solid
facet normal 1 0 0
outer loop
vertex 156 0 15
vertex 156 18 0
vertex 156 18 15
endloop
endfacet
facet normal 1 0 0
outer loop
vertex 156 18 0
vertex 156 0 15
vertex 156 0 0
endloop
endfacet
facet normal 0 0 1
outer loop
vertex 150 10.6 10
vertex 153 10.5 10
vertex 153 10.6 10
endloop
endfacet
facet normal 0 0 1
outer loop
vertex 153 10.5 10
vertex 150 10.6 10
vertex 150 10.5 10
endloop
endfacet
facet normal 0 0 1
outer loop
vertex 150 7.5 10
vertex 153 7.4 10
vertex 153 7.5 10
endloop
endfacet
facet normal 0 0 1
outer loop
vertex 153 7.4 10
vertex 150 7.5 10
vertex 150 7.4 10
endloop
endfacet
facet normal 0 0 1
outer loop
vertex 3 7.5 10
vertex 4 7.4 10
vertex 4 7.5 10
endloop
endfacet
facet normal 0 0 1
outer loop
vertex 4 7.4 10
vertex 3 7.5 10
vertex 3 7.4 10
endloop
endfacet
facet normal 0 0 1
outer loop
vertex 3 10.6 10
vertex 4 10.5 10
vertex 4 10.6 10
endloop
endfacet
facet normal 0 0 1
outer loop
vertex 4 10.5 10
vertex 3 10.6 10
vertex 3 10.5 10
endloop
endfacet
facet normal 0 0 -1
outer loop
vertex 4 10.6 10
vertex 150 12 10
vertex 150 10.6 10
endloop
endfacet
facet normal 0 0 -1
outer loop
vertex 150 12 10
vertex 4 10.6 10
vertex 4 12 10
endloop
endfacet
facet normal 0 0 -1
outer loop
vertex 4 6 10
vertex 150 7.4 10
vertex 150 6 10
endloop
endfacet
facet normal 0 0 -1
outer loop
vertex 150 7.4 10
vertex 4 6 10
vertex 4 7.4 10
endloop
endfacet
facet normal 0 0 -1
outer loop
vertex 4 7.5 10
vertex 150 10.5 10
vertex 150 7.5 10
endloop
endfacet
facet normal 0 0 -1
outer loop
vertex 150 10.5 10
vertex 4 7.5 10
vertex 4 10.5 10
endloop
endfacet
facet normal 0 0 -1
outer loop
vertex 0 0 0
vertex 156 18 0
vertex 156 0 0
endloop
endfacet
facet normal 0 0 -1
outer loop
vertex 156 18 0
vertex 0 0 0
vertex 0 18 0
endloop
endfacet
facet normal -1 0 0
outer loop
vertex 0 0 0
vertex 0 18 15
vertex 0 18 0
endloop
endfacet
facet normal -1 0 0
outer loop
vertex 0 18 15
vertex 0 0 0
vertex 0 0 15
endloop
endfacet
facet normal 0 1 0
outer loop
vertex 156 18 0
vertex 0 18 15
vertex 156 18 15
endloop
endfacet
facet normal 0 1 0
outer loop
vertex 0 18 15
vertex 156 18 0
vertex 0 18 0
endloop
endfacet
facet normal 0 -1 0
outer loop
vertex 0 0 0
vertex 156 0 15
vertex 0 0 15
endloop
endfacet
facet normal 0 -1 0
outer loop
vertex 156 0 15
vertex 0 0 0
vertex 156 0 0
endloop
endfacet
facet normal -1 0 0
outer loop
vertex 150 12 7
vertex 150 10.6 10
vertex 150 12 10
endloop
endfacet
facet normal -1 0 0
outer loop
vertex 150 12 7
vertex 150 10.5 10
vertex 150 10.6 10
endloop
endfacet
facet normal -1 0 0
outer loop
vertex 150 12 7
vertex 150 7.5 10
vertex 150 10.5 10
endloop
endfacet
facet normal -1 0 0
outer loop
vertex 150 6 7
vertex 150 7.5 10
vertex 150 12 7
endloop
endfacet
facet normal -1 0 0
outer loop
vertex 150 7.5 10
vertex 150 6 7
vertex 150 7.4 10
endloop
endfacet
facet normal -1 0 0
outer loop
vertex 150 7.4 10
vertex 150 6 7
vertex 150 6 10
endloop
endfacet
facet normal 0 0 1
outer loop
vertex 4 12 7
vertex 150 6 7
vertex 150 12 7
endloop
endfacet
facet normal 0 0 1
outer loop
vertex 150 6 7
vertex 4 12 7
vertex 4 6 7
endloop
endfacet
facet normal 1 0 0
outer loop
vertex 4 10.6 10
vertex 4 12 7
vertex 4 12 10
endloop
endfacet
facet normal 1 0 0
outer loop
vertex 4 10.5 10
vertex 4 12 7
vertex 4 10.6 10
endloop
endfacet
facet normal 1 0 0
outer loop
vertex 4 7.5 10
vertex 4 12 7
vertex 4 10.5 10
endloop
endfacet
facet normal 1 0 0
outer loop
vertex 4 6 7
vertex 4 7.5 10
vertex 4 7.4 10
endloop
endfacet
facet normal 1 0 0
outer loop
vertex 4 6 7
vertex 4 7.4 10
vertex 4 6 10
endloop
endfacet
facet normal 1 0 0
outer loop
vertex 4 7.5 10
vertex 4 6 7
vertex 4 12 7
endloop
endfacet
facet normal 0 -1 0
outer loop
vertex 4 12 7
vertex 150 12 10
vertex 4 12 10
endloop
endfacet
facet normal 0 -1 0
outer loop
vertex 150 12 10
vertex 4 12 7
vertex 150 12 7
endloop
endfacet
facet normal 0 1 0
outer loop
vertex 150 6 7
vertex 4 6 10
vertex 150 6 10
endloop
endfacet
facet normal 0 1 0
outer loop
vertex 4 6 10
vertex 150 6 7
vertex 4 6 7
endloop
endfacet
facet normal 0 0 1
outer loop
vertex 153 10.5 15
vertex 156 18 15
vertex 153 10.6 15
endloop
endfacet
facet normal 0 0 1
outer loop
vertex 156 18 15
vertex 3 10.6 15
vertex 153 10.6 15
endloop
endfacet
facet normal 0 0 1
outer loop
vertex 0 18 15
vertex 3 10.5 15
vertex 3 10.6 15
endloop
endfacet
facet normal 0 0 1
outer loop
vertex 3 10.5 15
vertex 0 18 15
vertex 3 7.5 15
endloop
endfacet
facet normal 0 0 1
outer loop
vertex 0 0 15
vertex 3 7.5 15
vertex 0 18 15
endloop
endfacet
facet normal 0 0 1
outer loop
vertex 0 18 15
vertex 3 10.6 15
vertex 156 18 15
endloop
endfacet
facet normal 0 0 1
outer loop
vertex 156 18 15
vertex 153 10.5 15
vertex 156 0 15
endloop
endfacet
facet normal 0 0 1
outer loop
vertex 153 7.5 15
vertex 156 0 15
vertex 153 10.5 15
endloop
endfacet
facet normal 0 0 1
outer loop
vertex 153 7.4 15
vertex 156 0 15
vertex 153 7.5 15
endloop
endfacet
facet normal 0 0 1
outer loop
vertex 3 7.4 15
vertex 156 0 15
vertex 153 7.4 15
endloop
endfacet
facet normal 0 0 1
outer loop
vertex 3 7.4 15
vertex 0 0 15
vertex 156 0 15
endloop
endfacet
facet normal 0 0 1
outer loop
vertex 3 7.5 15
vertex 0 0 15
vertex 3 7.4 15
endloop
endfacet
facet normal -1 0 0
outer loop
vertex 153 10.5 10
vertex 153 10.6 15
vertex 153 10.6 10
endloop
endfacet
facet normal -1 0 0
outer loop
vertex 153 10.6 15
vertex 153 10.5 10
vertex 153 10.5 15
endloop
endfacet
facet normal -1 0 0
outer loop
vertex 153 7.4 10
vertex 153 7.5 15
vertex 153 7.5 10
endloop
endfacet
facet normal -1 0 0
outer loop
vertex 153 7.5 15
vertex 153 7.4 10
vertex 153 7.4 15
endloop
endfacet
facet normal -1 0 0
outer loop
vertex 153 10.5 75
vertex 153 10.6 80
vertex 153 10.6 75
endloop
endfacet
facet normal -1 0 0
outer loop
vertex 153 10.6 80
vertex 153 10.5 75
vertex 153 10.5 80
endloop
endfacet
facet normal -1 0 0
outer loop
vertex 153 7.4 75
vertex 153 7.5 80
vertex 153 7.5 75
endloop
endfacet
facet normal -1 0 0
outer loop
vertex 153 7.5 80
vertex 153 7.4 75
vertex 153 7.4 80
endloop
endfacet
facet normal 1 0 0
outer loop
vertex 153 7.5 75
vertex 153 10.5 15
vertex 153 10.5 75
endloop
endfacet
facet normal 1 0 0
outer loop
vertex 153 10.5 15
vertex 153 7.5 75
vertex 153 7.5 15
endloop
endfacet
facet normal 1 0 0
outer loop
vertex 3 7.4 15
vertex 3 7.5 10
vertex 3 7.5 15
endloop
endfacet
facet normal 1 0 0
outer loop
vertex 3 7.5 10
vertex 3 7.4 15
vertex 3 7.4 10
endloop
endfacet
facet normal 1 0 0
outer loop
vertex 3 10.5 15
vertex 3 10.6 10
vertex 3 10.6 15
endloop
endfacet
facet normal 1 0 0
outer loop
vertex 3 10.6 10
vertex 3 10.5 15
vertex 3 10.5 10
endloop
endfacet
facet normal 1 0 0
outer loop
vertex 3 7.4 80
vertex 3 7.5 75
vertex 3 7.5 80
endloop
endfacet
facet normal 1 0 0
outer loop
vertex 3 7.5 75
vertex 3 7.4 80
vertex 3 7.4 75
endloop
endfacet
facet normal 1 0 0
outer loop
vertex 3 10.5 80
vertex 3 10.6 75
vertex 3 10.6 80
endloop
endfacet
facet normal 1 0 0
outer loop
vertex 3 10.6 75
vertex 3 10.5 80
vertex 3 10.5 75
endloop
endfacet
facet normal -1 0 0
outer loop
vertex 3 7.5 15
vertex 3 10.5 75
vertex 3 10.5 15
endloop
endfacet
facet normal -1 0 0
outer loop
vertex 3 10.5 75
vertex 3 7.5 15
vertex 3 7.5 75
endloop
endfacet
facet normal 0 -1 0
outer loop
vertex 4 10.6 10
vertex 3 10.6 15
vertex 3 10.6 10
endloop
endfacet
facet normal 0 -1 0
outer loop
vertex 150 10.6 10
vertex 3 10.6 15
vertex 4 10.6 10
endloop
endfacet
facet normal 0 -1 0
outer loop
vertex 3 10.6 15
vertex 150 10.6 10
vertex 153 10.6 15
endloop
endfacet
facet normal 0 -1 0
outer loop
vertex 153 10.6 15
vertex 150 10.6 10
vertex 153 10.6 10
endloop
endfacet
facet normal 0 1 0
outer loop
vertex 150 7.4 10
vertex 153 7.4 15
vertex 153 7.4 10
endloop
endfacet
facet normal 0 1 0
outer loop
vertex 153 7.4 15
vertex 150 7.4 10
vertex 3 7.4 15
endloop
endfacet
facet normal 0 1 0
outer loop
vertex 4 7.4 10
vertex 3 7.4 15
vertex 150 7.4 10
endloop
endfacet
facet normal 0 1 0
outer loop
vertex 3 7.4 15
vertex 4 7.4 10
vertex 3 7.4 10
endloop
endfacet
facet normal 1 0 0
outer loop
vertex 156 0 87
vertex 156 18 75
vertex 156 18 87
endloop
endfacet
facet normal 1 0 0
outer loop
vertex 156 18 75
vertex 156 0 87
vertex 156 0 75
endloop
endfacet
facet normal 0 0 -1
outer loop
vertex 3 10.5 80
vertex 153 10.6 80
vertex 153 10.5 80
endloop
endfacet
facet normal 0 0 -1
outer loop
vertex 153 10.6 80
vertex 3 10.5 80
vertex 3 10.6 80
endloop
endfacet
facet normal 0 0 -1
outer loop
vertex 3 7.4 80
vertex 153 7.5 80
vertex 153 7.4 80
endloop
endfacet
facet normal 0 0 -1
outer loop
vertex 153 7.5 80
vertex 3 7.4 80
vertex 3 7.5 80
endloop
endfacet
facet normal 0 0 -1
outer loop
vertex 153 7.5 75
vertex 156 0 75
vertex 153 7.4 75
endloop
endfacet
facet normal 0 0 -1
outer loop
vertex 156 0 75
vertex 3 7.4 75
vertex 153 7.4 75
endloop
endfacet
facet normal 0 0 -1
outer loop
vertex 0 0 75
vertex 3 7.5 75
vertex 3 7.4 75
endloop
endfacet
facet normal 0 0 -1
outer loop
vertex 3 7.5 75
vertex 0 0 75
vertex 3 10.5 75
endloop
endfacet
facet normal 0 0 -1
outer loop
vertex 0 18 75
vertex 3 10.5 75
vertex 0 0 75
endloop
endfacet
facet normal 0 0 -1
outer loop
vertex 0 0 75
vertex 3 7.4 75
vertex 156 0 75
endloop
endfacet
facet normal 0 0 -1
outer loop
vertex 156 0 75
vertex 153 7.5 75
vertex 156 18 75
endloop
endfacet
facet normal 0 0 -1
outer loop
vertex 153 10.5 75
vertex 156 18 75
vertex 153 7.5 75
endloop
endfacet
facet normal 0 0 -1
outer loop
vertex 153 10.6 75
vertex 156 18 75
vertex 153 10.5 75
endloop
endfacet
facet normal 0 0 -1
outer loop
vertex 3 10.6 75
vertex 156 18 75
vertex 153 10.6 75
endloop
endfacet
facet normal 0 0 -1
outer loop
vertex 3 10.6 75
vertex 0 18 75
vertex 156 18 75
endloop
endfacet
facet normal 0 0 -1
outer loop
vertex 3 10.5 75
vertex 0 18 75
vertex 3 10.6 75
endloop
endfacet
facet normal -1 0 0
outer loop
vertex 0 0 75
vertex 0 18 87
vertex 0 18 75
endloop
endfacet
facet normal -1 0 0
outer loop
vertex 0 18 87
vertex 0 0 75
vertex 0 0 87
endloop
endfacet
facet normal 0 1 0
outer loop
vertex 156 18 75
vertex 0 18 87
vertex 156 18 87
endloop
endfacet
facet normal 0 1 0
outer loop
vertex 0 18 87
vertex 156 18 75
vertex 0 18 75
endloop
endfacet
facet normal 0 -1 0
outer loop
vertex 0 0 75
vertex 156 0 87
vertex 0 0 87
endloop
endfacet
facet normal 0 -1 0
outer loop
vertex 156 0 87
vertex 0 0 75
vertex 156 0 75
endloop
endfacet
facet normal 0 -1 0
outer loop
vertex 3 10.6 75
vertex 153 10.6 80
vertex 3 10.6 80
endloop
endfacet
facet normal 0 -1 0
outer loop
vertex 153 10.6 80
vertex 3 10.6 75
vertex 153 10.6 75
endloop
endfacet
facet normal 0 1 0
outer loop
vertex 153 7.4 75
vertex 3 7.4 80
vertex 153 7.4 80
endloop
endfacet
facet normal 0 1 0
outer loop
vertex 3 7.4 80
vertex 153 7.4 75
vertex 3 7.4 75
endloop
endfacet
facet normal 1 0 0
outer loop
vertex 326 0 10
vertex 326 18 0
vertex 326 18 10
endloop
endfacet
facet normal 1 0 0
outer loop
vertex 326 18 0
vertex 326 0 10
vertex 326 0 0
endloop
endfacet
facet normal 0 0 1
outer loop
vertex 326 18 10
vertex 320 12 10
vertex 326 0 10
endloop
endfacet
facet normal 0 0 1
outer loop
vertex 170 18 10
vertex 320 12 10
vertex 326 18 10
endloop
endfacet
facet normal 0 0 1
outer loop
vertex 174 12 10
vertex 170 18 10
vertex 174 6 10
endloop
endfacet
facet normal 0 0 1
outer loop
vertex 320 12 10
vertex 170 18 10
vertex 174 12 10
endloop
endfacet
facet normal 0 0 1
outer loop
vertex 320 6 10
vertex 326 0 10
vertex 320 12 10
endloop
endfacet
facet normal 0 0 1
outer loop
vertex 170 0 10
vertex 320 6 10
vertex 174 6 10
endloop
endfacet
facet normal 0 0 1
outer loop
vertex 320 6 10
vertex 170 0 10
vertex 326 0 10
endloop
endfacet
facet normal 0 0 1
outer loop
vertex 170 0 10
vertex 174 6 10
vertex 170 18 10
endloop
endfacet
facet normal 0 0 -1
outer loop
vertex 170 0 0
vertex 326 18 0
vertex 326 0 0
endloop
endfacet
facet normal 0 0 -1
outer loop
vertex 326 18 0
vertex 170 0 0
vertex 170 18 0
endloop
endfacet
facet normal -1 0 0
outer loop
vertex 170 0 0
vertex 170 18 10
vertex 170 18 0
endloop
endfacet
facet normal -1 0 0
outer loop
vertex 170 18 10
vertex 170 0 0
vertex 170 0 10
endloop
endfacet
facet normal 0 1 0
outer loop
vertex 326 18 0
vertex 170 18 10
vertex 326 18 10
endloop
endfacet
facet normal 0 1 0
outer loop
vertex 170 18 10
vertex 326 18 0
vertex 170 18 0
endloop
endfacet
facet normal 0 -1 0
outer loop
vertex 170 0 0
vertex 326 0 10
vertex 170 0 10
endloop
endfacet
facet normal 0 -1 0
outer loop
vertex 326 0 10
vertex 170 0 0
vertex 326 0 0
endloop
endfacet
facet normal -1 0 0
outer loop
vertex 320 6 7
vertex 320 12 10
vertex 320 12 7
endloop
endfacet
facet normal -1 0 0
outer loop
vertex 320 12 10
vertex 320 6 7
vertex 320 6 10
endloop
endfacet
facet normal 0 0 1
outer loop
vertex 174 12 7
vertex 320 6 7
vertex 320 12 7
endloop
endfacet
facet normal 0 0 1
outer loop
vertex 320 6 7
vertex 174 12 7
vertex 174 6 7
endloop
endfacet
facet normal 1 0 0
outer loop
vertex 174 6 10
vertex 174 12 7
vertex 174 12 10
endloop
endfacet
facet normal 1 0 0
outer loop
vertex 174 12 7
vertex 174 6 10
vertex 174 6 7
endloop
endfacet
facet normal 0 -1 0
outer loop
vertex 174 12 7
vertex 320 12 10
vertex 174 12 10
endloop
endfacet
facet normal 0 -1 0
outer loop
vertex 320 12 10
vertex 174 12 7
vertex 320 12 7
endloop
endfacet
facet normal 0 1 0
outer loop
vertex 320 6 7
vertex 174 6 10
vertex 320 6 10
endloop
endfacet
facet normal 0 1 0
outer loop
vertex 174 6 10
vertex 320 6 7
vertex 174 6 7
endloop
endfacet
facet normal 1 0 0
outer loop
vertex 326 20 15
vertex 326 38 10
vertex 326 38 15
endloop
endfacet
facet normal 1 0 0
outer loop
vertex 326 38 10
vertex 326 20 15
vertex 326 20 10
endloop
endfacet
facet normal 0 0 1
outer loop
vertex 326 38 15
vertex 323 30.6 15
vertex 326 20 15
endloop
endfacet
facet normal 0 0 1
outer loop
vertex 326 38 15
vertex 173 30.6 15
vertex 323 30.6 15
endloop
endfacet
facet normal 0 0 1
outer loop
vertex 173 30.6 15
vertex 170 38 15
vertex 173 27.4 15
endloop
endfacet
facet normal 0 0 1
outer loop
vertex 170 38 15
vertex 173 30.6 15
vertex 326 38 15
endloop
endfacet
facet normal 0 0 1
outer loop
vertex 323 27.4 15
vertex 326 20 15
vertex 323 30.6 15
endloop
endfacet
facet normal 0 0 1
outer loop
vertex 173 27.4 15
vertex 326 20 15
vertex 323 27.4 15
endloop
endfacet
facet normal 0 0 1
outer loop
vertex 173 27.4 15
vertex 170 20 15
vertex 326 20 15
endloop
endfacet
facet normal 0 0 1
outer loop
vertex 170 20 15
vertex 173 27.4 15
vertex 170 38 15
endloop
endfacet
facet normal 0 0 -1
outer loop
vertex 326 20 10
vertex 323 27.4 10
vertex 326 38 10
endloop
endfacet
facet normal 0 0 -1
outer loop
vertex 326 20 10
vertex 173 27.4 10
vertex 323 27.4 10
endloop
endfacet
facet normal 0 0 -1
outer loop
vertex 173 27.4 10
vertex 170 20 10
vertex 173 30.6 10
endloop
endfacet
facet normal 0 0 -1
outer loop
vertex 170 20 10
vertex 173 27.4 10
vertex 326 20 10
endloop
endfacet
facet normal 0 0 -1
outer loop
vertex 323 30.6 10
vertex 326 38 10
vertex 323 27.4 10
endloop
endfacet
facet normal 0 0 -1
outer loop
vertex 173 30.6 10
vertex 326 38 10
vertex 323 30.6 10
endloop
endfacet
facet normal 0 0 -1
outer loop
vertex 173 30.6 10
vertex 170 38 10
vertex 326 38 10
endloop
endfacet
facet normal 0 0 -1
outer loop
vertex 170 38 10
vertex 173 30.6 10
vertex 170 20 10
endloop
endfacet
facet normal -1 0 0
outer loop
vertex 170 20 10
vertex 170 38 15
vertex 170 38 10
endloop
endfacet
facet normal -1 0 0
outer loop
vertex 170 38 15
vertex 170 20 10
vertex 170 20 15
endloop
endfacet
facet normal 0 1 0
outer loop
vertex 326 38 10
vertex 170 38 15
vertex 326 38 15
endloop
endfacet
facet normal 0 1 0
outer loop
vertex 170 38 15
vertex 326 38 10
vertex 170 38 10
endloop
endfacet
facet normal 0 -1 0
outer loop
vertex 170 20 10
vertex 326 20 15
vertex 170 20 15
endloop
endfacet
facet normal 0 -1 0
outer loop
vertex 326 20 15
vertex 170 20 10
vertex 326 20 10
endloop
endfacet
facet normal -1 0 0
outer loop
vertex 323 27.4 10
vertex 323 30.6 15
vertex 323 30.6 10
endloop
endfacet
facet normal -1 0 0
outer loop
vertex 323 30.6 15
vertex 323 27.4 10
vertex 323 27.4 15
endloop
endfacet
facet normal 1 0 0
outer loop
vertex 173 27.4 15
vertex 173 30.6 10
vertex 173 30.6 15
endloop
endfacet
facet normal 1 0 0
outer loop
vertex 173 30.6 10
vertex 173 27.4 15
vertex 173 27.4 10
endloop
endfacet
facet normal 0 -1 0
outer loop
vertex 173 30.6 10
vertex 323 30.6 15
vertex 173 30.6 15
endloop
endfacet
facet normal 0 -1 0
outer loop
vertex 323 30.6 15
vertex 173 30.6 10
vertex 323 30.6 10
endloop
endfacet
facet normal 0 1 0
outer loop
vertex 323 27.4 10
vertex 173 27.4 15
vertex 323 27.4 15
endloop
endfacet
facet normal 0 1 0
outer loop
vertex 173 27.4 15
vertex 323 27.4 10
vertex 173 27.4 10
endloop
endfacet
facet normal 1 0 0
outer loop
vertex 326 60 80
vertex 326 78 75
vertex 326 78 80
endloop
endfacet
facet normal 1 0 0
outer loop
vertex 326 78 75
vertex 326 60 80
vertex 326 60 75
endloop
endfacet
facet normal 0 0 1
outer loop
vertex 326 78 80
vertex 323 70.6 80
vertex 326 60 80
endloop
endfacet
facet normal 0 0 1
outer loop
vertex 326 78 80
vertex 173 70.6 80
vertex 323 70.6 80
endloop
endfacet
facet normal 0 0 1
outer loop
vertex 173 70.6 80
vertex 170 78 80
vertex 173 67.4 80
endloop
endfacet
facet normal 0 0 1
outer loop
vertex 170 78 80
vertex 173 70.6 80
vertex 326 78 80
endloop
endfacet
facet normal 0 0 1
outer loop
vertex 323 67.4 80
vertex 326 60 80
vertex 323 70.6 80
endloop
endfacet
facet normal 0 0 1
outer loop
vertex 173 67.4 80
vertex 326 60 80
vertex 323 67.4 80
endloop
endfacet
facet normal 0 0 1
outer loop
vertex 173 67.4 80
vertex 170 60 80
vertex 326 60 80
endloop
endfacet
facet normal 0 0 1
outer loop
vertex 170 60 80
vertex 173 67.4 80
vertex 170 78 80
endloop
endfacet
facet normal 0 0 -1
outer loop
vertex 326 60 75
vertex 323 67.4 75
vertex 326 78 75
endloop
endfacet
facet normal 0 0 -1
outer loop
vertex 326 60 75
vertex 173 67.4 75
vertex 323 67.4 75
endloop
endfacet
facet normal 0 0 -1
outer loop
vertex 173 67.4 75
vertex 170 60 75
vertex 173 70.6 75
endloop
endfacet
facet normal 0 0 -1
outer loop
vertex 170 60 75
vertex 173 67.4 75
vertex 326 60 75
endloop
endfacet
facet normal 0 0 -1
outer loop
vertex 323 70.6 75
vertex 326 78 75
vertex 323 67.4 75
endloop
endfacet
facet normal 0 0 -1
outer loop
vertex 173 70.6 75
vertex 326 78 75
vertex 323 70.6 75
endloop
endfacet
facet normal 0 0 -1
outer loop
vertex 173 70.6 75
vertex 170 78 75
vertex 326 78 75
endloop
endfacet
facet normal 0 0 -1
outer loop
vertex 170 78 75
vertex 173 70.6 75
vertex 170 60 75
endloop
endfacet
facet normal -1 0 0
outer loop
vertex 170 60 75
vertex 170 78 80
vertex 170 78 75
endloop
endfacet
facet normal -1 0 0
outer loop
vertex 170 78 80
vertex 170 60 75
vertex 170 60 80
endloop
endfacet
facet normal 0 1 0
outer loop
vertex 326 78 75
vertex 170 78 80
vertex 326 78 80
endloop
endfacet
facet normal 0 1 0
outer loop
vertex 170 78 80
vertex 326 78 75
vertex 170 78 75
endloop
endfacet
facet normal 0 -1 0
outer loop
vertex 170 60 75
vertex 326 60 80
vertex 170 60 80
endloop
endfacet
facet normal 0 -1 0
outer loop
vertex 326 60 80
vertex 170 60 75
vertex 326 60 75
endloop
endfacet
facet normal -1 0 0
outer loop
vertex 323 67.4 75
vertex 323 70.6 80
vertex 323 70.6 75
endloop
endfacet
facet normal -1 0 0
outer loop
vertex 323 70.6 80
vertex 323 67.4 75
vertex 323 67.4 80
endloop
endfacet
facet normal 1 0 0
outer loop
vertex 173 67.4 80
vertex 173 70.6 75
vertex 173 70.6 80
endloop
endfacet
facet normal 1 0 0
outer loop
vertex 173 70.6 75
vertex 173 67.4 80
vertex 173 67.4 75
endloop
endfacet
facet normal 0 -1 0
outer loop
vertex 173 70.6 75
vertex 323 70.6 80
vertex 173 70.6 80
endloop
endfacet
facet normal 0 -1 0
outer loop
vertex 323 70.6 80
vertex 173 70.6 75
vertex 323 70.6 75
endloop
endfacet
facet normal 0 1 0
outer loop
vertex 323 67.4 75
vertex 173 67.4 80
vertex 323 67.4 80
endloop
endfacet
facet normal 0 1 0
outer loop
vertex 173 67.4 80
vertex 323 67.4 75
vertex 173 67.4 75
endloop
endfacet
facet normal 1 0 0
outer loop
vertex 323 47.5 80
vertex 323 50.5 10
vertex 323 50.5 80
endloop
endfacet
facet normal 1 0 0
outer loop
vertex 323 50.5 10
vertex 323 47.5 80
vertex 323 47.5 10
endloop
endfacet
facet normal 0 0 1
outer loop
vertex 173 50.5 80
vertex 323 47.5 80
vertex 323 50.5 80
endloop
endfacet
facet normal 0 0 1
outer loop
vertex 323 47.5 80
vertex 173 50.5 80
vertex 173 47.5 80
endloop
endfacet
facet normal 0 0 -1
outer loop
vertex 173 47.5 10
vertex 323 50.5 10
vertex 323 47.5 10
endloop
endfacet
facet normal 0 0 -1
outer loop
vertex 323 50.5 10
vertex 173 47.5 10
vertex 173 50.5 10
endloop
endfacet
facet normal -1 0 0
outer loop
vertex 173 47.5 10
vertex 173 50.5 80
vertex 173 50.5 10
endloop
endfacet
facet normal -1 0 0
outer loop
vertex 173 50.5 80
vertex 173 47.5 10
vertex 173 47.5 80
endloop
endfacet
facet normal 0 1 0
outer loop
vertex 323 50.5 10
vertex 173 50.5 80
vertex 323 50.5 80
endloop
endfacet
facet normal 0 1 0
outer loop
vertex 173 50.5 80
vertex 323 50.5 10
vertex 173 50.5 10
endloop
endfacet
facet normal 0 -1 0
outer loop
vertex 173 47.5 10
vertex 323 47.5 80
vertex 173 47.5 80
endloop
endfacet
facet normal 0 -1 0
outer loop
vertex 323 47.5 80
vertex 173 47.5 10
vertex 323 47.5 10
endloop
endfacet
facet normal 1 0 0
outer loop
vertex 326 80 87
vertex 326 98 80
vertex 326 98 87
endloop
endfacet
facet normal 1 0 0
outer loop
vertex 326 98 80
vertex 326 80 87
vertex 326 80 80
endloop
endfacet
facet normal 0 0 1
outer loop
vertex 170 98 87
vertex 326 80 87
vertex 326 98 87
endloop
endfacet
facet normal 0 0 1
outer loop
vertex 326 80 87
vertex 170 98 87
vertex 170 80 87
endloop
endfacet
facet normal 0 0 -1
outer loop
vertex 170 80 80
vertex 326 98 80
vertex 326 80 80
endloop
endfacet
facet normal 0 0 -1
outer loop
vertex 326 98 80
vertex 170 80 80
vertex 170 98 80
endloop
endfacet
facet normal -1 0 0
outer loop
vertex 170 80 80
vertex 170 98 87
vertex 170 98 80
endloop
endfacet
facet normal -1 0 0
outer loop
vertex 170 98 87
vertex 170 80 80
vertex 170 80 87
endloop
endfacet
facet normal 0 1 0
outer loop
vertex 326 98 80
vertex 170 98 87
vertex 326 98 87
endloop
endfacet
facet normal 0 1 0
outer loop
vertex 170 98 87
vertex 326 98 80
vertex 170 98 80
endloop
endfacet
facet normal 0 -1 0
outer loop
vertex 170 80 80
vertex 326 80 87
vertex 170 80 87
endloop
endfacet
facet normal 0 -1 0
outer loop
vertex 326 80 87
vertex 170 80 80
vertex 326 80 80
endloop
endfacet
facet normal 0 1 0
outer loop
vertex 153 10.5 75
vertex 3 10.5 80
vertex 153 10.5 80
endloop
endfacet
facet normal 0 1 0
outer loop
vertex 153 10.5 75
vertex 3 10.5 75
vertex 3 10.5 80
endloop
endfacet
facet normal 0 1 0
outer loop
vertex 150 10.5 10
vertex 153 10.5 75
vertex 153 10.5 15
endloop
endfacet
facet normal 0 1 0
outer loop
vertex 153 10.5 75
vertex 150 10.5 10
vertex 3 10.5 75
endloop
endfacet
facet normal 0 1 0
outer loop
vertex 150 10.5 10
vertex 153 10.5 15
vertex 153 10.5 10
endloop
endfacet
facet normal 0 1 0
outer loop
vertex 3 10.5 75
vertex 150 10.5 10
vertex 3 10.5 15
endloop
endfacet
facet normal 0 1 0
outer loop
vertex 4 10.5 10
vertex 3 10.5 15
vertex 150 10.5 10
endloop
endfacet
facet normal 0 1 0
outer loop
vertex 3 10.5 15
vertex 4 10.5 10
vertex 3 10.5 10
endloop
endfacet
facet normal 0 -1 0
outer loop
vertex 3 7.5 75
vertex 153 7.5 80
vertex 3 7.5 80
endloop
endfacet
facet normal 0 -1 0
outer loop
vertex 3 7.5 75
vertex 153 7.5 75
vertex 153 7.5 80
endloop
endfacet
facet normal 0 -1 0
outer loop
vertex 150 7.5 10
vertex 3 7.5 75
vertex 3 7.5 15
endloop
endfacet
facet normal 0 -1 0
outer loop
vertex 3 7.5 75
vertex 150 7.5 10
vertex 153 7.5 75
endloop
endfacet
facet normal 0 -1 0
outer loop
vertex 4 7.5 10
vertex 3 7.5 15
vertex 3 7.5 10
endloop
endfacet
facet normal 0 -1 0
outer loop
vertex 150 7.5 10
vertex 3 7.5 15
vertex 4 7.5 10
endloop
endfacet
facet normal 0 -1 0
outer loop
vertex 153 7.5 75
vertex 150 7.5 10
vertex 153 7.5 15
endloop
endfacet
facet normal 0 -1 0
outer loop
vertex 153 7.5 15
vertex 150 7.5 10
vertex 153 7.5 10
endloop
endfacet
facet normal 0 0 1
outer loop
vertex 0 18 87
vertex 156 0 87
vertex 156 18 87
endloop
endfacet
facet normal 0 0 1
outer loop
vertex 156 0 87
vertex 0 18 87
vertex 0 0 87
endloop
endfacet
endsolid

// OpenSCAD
//Bottom thing
difference() {
    cube([156,18,10]);
    translate([4,6,7]) cube([146,6,4]);
}
//Ontop
difference(){
    translate([0,0,10])
    cube([156,18,5]);
    translate([3,7.4,10])
    cube([150,3.2,10]);
}
//Acrylglas
color([0.9,0,0,0.6])
translate([3,7.5,10])
cube([150,3,70]);

//Top
difference(){
    translate([0,0,75])
    cube([156,18,5]);
    translate([3,7.4,75])
    cube([150,3.2,10]);
}
//Ontop
translate([0,0,80])
cube([156,18,7]);

translate([170,0,0]){
    difference() {
        cube([156,18,10]);
        translate([4,6,7])    cube([146,6,4]);
    }
    translate([0,20,0]){
        //Ontop
        difference(){
            translate([0,0,10])
            cube([156,18,5]);
            translate([3,7.4,10])
            cube([150,3.2,10]);
        }
    }
    translate([0,40,0]){
        //Acrylglas
        color([0.9,0,0,0.6])
        translate([3,7.5,10])
        cube([150,3,70]);
    }
    translate([0,60,0]){
    //Top
        difference(){
            translate([0,0,75])
            cube([156,18,5]);
            translate([3,7.4,75])
            cube([150,3.2,10]);
        }
    }
    translate([0,80,0]){
        //Ontop
        translate([0,0,80])
        cube([156,18,7]);
    }
        
}
